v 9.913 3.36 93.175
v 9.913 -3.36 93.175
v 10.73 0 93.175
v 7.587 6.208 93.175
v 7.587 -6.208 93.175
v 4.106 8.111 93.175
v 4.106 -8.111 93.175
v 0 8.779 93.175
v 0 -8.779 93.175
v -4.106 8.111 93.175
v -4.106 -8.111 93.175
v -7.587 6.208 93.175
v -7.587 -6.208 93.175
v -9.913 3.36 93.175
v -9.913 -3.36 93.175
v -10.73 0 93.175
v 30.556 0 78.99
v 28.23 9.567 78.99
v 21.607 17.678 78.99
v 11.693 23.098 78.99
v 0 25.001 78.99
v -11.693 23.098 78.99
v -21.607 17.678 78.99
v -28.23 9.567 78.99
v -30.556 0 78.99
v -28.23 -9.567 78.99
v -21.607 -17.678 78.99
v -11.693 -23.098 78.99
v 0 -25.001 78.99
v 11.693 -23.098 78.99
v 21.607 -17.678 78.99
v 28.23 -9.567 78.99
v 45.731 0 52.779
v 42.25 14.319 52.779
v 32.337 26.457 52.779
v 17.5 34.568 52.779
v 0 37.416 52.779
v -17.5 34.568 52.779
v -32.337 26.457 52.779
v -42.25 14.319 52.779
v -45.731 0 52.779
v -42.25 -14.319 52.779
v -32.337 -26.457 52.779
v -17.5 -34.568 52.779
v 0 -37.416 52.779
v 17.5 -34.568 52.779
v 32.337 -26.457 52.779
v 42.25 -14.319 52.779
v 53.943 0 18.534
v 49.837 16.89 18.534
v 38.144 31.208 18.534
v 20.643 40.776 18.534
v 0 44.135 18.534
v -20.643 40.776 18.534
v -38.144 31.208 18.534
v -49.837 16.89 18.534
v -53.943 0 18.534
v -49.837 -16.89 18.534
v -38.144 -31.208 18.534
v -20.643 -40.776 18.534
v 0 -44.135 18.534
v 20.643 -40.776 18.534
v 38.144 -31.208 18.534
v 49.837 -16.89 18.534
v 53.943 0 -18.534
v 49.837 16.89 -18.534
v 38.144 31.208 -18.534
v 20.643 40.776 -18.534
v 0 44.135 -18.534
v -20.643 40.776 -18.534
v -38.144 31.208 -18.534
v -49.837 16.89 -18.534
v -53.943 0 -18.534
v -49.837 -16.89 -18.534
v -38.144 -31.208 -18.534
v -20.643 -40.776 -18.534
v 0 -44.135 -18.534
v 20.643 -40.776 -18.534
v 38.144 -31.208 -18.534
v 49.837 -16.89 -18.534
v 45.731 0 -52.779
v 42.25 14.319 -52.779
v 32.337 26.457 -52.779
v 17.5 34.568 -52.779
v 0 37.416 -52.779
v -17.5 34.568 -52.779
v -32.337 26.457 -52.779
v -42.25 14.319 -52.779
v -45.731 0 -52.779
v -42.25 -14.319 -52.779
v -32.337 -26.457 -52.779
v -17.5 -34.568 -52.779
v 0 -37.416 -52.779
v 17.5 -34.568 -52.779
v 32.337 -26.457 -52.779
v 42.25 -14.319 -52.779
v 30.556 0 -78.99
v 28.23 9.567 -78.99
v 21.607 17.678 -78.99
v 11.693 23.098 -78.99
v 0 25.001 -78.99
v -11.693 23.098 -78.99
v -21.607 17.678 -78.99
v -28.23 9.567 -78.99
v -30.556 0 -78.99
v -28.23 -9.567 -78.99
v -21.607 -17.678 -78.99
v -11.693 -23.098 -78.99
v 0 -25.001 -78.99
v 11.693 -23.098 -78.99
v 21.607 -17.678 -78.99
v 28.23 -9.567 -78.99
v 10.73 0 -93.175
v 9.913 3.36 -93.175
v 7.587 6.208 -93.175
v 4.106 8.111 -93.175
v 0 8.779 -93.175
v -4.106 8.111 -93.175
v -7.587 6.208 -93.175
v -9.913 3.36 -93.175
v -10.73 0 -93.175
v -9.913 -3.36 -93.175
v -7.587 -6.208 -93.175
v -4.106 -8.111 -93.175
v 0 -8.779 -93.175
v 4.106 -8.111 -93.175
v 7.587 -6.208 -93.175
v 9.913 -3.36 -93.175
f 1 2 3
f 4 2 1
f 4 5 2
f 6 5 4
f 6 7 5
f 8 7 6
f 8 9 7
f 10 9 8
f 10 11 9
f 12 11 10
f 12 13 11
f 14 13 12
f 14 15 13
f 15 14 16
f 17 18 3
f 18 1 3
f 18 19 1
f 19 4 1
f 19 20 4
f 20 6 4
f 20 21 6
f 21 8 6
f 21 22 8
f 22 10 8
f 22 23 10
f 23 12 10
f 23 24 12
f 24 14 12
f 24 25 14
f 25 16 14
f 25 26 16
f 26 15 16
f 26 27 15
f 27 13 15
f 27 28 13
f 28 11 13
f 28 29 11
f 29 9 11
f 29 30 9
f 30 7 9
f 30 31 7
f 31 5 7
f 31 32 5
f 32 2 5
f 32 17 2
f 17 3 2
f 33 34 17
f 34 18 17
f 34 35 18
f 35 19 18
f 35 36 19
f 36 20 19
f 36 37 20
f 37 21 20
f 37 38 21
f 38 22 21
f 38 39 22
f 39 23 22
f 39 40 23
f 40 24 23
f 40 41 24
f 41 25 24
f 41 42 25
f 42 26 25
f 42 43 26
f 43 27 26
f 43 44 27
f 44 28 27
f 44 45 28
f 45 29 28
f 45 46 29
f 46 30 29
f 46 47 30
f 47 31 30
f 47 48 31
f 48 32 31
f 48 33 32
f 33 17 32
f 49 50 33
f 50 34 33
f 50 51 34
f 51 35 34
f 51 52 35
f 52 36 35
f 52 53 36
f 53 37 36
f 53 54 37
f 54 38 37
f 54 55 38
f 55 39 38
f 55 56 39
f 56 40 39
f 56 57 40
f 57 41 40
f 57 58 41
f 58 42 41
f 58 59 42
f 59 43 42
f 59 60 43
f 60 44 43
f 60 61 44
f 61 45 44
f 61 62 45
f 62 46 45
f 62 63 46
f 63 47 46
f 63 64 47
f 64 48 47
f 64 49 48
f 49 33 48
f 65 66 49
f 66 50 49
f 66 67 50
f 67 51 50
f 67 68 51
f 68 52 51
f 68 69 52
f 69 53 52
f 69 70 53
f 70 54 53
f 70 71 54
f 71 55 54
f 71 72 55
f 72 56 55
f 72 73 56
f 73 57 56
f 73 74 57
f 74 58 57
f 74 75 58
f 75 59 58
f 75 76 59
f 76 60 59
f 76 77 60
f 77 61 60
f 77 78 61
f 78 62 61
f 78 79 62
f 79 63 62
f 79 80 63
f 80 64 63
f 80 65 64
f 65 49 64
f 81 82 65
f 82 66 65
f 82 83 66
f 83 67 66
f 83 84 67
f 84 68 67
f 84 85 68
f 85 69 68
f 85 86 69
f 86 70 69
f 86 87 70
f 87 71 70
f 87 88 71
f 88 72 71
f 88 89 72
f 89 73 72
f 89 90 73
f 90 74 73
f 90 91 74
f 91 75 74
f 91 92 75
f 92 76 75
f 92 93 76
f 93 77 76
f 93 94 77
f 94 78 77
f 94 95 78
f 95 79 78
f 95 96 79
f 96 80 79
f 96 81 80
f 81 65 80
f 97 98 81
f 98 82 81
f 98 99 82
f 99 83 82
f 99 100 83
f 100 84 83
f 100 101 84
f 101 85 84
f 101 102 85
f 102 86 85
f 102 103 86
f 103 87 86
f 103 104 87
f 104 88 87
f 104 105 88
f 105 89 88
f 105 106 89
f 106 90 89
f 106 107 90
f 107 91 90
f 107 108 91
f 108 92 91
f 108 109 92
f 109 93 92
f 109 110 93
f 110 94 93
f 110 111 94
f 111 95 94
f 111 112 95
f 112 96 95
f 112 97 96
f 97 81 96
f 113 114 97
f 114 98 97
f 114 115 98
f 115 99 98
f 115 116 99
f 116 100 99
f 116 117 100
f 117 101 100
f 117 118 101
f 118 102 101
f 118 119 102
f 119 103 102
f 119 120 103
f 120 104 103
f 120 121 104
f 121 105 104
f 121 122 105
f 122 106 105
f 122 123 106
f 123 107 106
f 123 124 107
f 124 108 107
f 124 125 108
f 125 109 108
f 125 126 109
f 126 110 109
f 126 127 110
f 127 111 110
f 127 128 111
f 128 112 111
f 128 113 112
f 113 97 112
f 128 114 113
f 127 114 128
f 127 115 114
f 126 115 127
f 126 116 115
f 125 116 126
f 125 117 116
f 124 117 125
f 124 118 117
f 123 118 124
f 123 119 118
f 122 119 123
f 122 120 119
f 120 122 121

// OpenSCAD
// Generated by SolidPython 1.0.1 on 2020-07-29 00:46:49


scale(v = [11, 9, 19]) {
	sphere(r = 5);
}
/***********************************************
*********      SolidPython code:      **********
************************************************
 
# import packages: SolidPython
from solid import *
from solid.utils import *
from itertools import chain, combinations, permutations


class Resize:

    def __init__(self, scad_file):
        self.scad_file = scad_file
        #self.scad_file = import_scad(scad_file)
        # cone/cylinder param:
        self.r1 = 0
        self.r2 = 0
        self.h = 0
        # rectangular prism param:
        self.w = 0
        self.l = 0
        # ellipse param:
        self.r = 0

    # import OpenScad code (file name corresponds to shape)


    # classify shape + parameters
    def assign(self, param1, param2, param3):
        if self.scad_file == 'cone.scad':
            self.r1 = param1
            self.r2 = param2
            self.h = param3
        elif self.scad_file == 'cylinder.scad':
            self.r1 = param1
            self.r2 = param2
            self.h = param3
        elif self.scad_file == 'rectangularPrism.scad':
            self.h = param1
            self.l = param2
            self.w = param3
        else:
            self.r = param1
            self.h = param2

    # resize parameters
    def iterate(self):
        x = range(3, 20, 2)
        i = 1
        if self.scad_file == 'cone.scad':
            tempList = list(permutations(x, 2))
            for temp in tempList:
                param1 = temp[0]
                param2 = temp[1]
                filepath = 'produced_scad_files/' + 'cone' + str(param1) + '_' + str(param2) + '_' + '.scad'
                scad_render_to_file(cylinder(h=param1, r1=param2, r2=0), filepath)

        elif self.scad_file == 'cylinder.scad':
            tempList = list(permutations(x, 3))
            for temp in tempList:
                param1 = temp[0]
                param2 = temp[1]
                filepath = 'produced_scad_files/' + 'cylinder' + str(param1) + '_' + str(param2) + '_' + '.scad'
                scad_render_to_file(cylinder(h=param1, r1=param2, r2=param2), filepath)

        elif self.scad_file == 'rectangularPrism.scad':
            tempList = list(permutations(x, 3))
            for temp in tempList:
                param1 = temp[0]
                param2 = temp[1]
                param3 = temp[2]
                filepath = 'produced_scad_files/' + 'rectangularPrism' + str(param1) + '_' + str(param2) + '_' + str(
                    param3) + '.scad'
                scad_render_to_file(cube(size=(param1, param2, param3)), filepath)

        elif self.scad_file == 'ellipse.scad':
            tempList = list(permutations(x, 4))
            for temp in tempList:
                param1 = temp[0]
                param2 = temp[1]
                param3 = temp[2]
                param4 = temp[3]
                filepath = 'produced_scad_files/' + 'ellipse' + str(param1) + '_' + str(param2) + '_' + str(param3) + '_' + str(param4) + '.scad'
                scad_render_to_file(scale([param1, param2, param3])(sphere(r=param4)), filepath)

    def render_to_scadfile(self):
        scad_render_to_file(scad, 'example.scad') 
 
************************************************/
